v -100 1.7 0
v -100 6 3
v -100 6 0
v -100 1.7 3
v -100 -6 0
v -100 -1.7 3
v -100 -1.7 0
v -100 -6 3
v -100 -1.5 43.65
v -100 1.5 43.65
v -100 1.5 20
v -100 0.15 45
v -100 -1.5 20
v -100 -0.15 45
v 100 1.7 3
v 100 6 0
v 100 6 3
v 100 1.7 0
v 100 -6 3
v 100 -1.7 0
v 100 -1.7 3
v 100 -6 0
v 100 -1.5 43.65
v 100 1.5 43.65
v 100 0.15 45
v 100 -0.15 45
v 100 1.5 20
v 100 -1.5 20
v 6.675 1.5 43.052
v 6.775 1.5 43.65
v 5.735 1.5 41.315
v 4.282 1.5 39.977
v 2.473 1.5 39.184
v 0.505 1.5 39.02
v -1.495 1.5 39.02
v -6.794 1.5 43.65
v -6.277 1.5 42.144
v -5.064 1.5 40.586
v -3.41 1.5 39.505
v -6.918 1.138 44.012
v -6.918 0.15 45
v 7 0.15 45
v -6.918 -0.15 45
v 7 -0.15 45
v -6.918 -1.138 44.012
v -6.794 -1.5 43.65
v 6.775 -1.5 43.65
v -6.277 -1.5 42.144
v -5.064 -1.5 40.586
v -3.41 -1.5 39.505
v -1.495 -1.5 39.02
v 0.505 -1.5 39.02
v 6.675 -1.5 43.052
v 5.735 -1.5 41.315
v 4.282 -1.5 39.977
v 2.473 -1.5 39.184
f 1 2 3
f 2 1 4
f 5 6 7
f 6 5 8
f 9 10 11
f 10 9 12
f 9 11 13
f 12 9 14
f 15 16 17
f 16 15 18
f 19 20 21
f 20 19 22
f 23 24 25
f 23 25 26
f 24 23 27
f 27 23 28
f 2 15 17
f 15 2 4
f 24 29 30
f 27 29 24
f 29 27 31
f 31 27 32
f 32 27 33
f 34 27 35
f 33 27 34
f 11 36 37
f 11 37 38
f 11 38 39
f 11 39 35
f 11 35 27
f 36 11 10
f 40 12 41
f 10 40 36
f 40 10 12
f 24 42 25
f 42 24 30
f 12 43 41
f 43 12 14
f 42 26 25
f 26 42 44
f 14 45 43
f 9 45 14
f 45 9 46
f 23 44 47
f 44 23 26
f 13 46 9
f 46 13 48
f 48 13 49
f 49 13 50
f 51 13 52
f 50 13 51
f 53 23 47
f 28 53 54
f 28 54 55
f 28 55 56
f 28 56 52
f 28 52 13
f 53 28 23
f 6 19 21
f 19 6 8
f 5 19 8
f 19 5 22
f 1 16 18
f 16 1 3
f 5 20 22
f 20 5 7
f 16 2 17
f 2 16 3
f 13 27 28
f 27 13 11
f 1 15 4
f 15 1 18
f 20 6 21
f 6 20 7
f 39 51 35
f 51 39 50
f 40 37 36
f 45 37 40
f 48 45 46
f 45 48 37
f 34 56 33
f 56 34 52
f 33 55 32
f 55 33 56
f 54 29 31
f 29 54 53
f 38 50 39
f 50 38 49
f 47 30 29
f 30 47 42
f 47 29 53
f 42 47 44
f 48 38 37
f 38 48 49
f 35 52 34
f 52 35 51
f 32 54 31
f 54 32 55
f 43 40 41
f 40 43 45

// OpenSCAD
// orcad: drawer divider panel with a glue flange, a stacking slot and a finger grip.
length = 200;
height = 45;
thickness = 3;
flange_width = 12;
flange_thickness = 3;
slot_width = 3.4;
slot_depth = 20;
top_radius = 3;
grip_width = 14;
grip_depth = 8;

flange_w = max(flange_width, thickness + 2);
flange_t = min(flange_thickness, height / 2);
r = min(top_radius, thickness / 2 * 0.9);
grip_w = min(grip_width, length - 4);
grip_d = min(grip_depth, height - flange_t - 2, max(grip_w / 2 - 1, 1));

// Side profile in the y/z plane, extruded along x.
profile = [
    [-flange_w / 2, 0],
    [flange_w / 2, 0],
    [flange_w / 2, flange_t],
    [thickness / 2, flange_t],
    [thickness / 2, height - r],
    [thickness / 2 - r, height],
    [-thickness / 2 + r, height],
    [-thickness / 2, height - r],
    [-thickness / 2, flange_t],
    [-flange_w / 2, flange_t]
];

difference() {
    rotate([90, 0, 90])
        linear_extrude(height = length, center = true)
            polygon(profile);

    // Slot that lets a second divider cross this one at right angles.
    if (slot_width > 0)
        translate([-length / 2 - 1, -slot_width / 2, 0])
            cube([length + 2, slot_width, min(slot_depth, height)]);

    // Finger grip in the top edge.
    if (grip_w > 0 && grip_d > 0)
        hull()
            for (x = [-grip_w / 2 + grip_d, grip_w / 2 - grip_d])
                translate([x, -thickness, height])
                    rotate([-90, 0, 0])
                        cylinder(d = 2 * grip_d, h = 3 * thickness);
}
